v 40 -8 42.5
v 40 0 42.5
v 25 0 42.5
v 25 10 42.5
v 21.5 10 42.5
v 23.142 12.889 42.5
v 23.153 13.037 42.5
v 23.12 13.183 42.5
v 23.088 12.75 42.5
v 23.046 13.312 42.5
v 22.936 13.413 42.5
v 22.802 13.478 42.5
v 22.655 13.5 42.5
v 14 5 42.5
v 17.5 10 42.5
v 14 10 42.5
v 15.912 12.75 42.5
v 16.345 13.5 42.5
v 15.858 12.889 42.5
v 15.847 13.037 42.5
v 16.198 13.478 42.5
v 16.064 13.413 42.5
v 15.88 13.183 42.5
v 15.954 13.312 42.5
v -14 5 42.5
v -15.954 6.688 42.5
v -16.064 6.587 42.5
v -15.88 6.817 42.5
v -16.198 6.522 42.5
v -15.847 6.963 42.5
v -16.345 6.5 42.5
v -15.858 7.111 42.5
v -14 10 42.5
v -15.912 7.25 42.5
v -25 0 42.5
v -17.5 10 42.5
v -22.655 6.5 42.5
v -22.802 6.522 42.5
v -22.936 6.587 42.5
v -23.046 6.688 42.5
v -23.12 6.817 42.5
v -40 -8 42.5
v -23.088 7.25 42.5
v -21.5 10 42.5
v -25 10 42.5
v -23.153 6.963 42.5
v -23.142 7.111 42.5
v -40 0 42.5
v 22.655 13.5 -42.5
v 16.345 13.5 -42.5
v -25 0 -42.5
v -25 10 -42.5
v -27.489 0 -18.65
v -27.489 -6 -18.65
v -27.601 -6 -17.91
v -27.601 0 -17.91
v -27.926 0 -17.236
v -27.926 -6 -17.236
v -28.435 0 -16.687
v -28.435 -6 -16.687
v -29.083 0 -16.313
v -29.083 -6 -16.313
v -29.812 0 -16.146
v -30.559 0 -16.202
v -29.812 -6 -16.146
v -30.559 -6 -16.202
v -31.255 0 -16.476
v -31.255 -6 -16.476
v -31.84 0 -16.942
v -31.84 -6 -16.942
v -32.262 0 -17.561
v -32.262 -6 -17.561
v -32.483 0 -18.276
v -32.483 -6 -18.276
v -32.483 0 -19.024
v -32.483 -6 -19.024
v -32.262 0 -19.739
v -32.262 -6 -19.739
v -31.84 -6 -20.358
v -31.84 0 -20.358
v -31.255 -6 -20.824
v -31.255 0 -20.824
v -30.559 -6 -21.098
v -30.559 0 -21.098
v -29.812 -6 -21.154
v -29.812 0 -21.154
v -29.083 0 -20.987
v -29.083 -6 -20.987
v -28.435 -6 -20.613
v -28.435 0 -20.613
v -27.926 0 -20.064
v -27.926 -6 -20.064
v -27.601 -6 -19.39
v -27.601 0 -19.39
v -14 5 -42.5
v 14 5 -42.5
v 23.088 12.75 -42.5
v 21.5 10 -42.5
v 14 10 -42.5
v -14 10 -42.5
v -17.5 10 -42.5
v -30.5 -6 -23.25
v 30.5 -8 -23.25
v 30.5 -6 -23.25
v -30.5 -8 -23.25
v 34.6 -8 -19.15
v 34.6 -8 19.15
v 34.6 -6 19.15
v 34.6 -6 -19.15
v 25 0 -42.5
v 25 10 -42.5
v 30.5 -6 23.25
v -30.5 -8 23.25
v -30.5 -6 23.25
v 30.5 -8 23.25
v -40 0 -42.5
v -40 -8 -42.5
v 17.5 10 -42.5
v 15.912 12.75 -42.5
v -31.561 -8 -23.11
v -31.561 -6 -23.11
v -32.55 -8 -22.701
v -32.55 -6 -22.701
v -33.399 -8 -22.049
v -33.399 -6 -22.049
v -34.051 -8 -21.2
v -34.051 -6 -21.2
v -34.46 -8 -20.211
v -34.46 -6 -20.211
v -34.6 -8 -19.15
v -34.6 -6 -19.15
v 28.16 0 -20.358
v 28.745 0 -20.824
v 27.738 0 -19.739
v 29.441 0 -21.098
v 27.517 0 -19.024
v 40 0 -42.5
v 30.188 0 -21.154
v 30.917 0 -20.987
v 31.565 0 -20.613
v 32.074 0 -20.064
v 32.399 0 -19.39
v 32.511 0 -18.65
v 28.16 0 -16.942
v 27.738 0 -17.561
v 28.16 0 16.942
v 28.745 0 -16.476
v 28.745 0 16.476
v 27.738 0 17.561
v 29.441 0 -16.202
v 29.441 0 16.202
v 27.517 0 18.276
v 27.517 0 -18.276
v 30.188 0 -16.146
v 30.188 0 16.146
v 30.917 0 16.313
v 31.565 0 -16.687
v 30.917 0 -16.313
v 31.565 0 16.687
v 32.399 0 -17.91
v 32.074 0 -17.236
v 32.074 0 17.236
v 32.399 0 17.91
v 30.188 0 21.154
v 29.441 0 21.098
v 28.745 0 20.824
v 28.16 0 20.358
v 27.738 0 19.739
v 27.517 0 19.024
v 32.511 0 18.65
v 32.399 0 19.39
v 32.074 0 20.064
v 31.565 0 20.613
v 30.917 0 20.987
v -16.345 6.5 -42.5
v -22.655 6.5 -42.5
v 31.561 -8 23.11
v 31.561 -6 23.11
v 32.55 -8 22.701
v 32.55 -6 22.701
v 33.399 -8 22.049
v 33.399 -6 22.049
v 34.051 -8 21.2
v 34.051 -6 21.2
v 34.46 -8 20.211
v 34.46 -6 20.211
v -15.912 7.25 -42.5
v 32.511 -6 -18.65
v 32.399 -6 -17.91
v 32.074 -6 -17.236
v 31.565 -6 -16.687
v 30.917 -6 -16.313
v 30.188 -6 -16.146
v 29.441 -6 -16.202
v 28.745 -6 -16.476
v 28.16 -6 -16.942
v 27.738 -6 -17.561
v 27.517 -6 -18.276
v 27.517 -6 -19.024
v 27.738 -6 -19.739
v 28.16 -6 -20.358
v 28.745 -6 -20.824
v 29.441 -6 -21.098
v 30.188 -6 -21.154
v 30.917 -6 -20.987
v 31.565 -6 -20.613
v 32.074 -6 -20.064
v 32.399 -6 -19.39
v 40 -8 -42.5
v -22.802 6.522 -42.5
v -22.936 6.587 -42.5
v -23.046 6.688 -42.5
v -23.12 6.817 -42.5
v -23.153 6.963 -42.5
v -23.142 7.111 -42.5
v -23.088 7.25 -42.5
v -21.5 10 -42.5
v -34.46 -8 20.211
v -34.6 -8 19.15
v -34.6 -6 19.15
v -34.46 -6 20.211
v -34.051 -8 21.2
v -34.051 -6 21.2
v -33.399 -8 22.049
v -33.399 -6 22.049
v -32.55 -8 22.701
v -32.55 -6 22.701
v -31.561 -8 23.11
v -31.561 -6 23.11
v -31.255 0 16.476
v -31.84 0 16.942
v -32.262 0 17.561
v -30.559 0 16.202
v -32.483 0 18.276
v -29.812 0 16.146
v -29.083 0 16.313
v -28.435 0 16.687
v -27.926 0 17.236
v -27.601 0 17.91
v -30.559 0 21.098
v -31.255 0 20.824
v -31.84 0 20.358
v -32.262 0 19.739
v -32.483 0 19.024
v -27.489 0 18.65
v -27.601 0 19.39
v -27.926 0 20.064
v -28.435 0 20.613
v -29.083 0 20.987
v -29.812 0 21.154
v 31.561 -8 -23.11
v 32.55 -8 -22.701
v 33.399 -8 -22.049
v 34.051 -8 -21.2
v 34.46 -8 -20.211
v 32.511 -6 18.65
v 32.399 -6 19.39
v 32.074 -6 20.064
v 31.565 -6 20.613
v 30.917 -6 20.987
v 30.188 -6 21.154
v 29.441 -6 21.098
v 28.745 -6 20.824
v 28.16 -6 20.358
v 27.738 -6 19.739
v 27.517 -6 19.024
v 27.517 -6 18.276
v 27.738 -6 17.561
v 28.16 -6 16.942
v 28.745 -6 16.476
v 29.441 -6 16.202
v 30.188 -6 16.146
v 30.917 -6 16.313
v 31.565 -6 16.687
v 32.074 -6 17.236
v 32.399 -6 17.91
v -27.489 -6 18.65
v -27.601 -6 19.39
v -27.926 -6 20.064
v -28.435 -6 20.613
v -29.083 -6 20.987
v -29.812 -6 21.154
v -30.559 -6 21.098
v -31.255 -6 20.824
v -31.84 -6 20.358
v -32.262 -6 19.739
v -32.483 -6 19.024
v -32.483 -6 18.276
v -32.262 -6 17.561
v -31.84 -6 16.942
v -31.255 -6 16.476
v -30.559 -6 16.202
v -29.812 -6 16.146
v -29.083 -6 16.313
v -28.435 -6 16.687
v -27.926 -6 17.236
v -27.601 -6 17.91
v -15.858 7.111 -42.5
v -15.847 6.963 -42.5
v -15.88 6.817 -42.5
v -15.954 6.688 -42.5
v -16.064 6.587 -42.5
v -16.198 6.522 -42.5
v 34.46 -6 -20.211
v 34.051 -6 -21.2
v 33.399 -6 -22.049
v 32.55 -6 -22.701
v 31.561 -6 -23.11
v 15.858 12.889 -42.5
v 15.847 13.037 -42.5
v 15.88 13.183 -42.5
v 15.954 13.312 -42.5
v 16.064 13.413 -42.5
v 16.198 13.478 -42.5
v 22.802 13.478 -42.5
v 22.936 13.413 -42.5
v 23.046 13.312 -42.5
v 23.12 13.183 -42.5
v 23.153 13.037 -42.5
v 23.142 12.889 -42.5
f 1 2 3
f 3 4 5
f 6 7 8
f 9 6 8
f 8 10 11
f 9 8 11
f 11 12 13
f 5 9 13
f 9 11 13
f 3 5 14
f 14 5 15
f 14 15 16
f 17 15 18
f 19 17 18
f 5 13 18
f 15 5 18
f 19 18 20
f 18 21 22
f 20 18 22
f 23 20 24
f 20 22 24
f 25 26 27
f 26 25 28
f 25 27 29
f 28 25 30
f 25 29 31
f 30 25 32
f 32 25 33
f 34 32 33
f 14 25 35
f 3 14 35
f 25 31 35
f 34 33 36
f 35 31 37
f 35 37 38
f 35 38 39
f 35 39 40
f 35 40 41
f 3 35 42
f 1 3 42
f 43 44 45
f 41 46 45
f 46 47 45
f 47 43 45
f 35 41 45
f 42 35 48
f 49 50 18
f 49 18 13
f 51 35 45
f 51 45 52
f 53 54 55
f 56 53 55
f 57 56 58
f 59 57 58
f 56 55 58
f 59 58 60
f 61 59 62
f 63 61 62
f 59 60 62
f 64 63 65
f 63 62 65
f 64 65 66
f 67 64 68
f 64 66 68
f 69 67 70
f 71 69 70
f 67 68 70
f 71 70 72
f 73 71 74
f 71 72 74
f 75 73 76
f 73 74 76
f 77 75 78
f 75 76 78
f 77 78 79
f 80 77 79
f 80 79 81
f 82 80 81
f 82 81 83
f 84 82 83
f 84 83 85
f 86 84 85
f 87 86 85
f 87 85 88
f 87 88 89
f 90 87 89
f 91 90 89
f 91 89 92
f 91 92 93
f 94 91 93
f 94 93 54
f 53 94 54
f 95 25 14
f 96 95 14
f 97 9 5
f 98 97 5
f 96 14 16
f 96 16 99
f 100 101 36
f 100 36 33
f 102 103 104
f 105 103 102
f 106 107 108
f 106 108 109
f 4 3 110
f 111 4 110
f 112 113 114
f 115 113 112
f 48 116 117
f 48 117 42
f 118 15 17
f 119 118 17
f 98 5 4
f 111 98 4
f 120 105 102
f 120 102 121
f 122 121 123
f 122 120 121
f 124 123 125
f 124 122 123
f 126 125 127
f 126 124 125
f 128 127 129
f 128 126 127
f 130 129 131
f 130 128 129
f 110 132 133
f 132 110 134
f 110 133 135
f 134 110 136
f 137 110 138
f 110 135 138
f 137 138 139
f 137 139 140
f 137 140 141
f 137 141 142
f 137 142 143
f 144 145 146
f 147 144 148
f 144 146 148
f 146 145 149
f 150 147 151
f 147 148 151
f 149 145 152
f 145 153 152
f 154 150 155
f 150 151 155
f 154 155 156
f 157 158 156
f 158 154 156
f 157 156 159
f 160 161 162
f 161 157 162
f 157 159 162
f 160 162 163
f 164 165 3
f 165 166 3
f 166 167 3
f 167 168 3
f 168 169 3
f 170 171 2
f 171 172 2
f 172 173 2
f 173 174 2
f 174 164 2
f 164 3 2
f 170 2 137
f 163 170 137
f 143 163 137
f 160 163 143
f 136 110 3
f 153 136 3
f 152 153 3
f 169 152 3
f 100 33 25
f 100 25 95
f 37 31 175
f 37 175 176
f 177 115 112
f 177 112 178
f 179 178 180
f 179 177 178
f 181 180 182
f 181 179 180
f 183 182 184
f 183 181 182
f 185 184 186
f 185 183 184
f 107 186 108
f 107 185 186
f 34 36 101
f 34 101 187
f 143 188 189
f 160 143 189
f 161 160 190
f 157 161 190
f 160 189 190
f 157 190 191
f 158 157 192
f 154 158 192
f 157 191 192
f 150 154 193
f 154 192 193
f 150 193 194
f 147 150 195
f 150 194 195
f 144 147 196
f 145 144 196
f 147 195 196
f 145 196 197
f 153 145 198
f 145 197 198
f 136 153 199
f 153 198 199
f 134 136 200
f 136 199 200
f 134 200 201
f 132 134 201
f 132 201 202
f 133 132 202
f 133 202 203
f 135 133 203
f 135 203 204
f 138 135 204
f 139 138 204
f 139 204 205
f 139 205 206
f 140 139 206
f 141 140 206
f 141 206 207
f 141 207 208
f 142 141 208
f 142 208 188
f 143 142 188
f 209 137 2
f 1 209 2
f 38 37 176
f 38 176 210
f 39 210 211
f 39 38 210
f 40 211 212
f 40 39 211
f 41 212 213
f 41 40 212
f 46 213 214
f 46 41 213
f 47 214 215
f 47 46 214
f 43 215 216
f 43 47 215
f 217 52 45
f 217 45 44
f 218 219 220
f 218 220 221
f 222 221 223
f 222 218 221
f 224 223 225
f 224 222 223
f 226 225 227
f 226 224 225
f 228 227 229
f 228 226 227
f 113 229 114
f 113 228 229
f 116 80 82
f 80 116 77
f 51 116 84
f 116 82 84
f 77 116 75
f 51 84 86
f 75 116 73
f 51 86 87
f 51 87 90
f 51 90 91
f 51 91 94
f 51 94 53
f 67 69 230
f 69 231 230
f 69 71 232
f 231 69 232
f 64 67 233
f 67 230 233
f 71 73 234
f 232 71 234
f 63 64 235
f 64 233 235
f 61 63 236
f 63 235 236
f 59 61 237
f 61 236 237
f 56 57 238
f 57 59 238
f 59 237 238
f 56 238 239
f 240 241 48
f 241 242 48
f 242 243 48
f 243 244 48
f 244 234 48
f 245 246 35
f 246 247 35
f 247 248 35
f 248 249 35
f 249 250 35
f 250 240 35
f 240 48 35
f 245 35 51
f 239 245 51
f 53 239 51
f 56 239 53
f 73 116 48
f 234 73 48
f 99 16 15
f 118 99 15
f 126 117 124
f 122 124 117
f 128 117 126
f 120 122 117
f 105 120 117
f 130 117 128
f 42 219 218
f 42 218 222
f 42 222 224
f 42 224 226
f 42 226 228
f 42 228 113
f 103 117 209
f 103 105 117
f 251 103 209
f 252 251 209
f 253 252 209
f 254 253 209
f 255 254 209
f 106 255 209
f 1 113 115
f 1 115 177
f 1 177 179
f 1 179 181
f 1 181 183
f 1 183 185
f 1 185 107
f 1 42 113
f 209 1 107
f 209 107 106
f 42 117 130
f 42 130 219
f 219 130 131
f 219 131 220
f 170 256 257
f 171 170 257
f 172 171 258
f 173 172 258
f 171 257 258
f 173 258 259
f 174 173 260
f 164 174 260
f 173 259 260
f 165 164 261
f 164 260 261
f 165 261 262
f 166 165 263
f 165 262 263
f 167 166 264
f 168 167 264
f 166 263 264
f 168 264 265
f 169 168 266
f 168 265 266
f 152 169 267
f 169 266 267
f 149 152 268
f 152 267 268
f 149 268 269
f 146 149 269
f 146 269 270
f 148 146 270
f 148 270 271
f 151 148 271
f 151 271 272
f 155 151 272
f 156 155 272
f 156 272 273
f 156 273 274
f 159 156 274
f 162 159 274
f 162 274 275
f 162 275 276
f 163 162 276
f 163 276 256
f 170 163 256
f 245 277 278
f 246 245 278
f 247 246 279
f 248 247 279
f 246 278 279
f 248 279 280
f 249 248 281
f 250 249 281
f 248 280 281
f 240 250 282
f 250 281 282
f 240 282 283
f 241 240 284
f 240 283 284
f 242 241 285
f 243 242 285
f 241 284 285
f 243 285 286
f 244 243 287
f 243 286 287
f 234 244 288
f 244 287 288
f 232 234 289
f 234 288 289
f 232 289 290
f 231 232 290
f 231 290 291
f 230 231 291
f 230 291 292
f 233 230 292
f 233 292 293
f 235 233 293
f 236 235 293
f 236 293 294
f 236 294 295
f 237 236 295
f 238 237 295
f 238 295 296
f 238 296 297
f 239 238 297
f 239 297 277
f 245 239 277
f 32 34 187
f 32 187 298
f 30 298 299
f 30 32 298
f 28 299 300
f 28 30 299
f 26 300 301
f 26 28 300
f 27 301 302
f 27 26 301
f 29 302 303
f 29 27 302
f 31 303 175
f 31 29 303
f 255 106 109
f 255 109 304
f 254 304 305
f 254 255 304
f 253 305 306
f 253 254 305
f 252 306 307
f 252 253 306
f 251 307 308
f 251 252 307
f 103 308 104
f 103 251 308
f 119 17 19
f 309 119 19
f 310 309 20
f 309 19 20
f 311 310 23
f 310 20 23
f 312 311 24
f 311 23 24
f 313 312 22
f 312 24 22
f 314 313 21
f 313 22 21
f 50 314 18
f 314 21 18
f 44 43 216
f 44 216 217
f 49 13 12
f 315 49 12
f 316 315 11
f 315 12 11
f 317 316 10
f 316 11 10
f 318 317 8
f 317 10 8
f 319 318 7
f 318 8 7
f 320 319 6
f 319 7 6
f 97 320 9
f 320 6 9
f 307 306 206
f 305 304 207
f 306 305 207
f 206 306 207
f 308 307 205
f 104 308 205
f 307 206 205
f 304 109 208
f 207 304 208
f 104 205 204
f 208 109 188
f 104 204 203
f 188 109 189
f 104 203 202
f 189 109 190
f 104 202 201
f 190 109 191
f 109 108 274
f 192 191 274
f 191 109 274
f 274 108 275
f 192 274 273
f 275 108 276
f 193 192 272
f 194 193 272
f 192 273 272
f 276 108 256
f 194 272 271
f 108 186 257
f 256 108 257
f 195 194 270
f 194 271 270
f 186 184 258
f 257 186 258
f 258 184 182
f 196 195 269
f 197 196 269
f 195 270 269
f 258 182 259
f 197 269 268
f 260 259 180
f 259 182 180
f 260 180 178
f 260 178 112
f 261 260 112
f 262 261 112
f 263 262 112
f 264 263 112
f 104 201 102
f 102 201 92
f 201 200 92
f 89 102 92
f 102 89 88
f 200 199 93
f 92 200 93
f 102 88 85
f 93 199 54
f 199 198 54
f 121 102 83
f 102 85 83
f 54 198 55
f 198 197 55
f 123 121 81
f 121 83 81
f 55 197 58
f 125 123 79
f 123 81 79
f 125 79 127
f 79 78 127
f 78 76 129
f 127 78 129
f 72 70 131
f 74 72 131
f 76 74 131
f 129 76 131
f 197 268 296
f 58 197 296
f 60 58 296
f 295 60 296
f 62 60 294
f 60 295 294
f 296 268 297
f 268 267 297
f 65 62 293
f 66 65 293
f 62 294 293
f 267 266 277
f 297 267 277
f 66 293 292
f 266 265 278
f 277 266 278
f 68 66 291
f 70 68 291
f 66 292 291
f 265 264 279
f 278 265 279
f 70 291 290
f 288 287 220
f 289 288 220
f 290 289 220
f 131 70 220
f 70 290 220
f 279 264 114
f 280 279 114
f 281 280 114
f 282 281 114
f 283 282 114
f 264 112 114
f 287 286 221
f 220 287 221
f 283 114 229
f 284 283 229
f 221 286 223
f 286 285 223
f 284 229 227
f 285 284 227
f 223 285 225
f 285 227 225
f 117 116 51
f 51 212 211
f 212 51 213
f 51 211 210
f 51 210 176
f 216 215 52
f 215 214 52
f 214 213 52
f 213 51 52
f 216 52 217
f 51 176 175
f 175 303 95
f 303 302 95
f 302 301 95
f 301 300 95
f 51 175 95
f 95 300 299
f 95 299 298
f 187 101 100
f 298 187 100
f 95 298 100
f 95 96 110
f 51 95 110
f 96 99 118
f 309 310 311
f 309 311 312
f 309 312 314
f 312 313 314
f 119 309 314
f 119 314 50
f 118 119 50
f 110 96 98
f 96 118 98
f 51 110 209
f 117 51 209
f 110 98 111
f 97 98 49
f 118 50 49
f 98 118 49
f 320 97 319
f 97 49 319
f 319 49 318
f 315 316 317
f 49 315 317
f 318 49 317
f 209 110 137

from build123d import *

# Parameters (mm, degrees)
SKETCH7_W           = 50
SKETCH7_H           = 85
BOSS_EXTRUDE5_DEPTH = 10
SKETCH8_W           = 28
SKETCH8_H           = 85
CUT_EXTRUDE1_DEPTH  = 5
SKETCH11_W          = 11
SKETCH11_H          = 85
BOSS_EXTRUDE6_DEPTH = 3.5
CUT_EXTRUDE5_DEPTH  = 86
CUT_EXTRUDE6_DEPTH  = 86
SKETCH14_W          = 50
SKETCH14_H          = 85
SKETCH14_W_2        = 15
BOSS_EXTRUDE7_DEPTH = 8
CUT_EXTRUDE11_DEPTH = 2
SKETCH19_R          = 2.510624494
CUT_EXTRUDE12_DEPTH = 20.5


with BuildPart() as part:
    # Sketch7 → Boss-Extrude5 (new body)
    with BuildSketch(Plane(origin=(0, 0, 0), x_dir=(1, 0, 0), z_dir=(0, 1, 0))):
        Rectangle(SKETCH7_W, SKETCH7_H)
    extrude(amount=BOSS_EXTRUDE5_DEPTH)

    # Sketch8 → Cut-Extrude1 (cut)
    with BuildSketch(Plane(origin=(0, 10, 0), x_dir=(1, 0, 0), z_dir=(0, 1, 0))):
        Rectangle(SKETCH8_W, SKETCH8_H)
    extrude(amount=-CUT_EXTRUDE1_DEPTH, mode=Mode.SUBTRACT)

    # Sketch11 → Boss-Extrude6 (add)
    with BuildSketch(Plane(origin=(0, 10, 0), x_dir=(1, 0, 0), z_dir=(0, 1, 0))):
        with Locations((19.5, 0)):
            Rectangle(SKETCH11_W, SKETCH11_H)
    extrude(amount=BOSS_EXTRUDE6_DEPTH)

    # Sketch12 → Cut-Extrude5 (cut, through all)
    with BuildSketch(Plane.XY.offset(42.5)):
        with BuildLine():
            Line((-21.5, 10), (-17.5, 10))
            Line((-17.5, 10), (-15.91228676, 7.25))
            ThreePointArc((-15.91228676, 7.25), (-15.91228676, 6.75), (-16.345299462, 6.5))
            Line((-16.345299462, 6.5), (-22.654700538, 6.5))
            ThreePointArc((-22.654700538, 6.5), (-23.08771324, 6.75), (-23.08771324, 7.25))
            Line((-23.08771324, 7.25), (-21.5, 10))
        make_face()
    extrude(amount=-CUT_EXTRUDE5_DEPTH, mode=Mode.SUBTRACT)

    # Sketch13 → Cut-Extrude6 (cut, through all)
    with BuildSketch(Plane.XY.offset(42.5)):
        with BuildLine():
            Line((21.5, 10), (25, 10))
            Line((25, 10), (25, 13.5))
            Line((25, 13.5), (22.654700538, 13.5))
            ThreePointArc((22.654700538, 13.5), (23.08771324, 13.25), (23.08771324, 12.75))
            Line((23.08771324, 12.75), (21.5, 10))
        make_face()
        with BuildLine():
            Line((14, 10), (17.5, 10))
            Line((17.5, 10), (15.91228676, 12.75))
            ThreePointArc((15.91228676, 12.75), (15.91228676, 13.25), (16.345299462, 13.5))
            Line((16.345299462, 13.5), (14, 13.5))
            Line((14, 13.5), (14, 10))
        make_face()
    extrude(amount=-CUT_EXTRUDE6_DEPTH, mode=Mode.SUBTRACT)

    # Sketch14 → Boss-Extrude7 (add)
    with BuildSketch(Plane.XZ):
        Rectangle(SKETCH14_W, SKETCH14_H)
        with Locations((32.5, 0)):
            Rectangle(SKETCH14_W_2, SKETCH14_H)
        with Locations((-32.5, 0)):
            Rectangle(SKETCH14_W_2, SKETCH14_H)
    extrude(amount=BOSS_EXTRUDE7_DEPTH)

    # Sketch18 → Cut-Extrude11 (cut)
    with BuildSketch(Plane.XZ.offset(8)):
        with BuildLine():
            Line((30.5, -23.25), (-30.5, -23.25))
            ThreePointArc((-30.5, -23.25), (-33.399137803, -22.049137803), (-34.6, -19.15))
            Line((-34.6, -19.15), (-34.6, 19.15))
            ThreePointArc((-34.6, 19.15), (-33.399137803, 22.049137803), (-30.5, 23.25))
            Line((-30.5, 23.25), (30.5, 23.25))
            ThreePointArc((30.5, 23.25), (33.399137803, 22.049137803), (34.6, 19.15))
            Line((34.6, 19.15), (34.6, -19.15))
            ThreePointArc((34.6, -19.15), (33.399137803, -22.049137803), (30.5, -23.25))
        make_face()
    extrude(amount=-CUT_EXTRUDE11_DEPTH, mode=Mode.SUBTRACT)

    # Sketch19 → Cut-Extrude12 (cut, through all)
    with BuildSketch(Plane.XZ.offset(6)):
        with Locations((-30, 18.65)):
            Circle(SKETCH19_R)
        with Locations((-30, -18.65)):
            Circle(SKETCH19_R)
        with Locations((30, -18.65)):
            Circle(SKETCH19_R)
        with Locations((30, 18.65)):
            Circle(SKETCH19_R)
    extrude(amount=-CUT_EXTRUDE12_DEPTH, mode=Mode.SUBTRACT)


solid = part.part
